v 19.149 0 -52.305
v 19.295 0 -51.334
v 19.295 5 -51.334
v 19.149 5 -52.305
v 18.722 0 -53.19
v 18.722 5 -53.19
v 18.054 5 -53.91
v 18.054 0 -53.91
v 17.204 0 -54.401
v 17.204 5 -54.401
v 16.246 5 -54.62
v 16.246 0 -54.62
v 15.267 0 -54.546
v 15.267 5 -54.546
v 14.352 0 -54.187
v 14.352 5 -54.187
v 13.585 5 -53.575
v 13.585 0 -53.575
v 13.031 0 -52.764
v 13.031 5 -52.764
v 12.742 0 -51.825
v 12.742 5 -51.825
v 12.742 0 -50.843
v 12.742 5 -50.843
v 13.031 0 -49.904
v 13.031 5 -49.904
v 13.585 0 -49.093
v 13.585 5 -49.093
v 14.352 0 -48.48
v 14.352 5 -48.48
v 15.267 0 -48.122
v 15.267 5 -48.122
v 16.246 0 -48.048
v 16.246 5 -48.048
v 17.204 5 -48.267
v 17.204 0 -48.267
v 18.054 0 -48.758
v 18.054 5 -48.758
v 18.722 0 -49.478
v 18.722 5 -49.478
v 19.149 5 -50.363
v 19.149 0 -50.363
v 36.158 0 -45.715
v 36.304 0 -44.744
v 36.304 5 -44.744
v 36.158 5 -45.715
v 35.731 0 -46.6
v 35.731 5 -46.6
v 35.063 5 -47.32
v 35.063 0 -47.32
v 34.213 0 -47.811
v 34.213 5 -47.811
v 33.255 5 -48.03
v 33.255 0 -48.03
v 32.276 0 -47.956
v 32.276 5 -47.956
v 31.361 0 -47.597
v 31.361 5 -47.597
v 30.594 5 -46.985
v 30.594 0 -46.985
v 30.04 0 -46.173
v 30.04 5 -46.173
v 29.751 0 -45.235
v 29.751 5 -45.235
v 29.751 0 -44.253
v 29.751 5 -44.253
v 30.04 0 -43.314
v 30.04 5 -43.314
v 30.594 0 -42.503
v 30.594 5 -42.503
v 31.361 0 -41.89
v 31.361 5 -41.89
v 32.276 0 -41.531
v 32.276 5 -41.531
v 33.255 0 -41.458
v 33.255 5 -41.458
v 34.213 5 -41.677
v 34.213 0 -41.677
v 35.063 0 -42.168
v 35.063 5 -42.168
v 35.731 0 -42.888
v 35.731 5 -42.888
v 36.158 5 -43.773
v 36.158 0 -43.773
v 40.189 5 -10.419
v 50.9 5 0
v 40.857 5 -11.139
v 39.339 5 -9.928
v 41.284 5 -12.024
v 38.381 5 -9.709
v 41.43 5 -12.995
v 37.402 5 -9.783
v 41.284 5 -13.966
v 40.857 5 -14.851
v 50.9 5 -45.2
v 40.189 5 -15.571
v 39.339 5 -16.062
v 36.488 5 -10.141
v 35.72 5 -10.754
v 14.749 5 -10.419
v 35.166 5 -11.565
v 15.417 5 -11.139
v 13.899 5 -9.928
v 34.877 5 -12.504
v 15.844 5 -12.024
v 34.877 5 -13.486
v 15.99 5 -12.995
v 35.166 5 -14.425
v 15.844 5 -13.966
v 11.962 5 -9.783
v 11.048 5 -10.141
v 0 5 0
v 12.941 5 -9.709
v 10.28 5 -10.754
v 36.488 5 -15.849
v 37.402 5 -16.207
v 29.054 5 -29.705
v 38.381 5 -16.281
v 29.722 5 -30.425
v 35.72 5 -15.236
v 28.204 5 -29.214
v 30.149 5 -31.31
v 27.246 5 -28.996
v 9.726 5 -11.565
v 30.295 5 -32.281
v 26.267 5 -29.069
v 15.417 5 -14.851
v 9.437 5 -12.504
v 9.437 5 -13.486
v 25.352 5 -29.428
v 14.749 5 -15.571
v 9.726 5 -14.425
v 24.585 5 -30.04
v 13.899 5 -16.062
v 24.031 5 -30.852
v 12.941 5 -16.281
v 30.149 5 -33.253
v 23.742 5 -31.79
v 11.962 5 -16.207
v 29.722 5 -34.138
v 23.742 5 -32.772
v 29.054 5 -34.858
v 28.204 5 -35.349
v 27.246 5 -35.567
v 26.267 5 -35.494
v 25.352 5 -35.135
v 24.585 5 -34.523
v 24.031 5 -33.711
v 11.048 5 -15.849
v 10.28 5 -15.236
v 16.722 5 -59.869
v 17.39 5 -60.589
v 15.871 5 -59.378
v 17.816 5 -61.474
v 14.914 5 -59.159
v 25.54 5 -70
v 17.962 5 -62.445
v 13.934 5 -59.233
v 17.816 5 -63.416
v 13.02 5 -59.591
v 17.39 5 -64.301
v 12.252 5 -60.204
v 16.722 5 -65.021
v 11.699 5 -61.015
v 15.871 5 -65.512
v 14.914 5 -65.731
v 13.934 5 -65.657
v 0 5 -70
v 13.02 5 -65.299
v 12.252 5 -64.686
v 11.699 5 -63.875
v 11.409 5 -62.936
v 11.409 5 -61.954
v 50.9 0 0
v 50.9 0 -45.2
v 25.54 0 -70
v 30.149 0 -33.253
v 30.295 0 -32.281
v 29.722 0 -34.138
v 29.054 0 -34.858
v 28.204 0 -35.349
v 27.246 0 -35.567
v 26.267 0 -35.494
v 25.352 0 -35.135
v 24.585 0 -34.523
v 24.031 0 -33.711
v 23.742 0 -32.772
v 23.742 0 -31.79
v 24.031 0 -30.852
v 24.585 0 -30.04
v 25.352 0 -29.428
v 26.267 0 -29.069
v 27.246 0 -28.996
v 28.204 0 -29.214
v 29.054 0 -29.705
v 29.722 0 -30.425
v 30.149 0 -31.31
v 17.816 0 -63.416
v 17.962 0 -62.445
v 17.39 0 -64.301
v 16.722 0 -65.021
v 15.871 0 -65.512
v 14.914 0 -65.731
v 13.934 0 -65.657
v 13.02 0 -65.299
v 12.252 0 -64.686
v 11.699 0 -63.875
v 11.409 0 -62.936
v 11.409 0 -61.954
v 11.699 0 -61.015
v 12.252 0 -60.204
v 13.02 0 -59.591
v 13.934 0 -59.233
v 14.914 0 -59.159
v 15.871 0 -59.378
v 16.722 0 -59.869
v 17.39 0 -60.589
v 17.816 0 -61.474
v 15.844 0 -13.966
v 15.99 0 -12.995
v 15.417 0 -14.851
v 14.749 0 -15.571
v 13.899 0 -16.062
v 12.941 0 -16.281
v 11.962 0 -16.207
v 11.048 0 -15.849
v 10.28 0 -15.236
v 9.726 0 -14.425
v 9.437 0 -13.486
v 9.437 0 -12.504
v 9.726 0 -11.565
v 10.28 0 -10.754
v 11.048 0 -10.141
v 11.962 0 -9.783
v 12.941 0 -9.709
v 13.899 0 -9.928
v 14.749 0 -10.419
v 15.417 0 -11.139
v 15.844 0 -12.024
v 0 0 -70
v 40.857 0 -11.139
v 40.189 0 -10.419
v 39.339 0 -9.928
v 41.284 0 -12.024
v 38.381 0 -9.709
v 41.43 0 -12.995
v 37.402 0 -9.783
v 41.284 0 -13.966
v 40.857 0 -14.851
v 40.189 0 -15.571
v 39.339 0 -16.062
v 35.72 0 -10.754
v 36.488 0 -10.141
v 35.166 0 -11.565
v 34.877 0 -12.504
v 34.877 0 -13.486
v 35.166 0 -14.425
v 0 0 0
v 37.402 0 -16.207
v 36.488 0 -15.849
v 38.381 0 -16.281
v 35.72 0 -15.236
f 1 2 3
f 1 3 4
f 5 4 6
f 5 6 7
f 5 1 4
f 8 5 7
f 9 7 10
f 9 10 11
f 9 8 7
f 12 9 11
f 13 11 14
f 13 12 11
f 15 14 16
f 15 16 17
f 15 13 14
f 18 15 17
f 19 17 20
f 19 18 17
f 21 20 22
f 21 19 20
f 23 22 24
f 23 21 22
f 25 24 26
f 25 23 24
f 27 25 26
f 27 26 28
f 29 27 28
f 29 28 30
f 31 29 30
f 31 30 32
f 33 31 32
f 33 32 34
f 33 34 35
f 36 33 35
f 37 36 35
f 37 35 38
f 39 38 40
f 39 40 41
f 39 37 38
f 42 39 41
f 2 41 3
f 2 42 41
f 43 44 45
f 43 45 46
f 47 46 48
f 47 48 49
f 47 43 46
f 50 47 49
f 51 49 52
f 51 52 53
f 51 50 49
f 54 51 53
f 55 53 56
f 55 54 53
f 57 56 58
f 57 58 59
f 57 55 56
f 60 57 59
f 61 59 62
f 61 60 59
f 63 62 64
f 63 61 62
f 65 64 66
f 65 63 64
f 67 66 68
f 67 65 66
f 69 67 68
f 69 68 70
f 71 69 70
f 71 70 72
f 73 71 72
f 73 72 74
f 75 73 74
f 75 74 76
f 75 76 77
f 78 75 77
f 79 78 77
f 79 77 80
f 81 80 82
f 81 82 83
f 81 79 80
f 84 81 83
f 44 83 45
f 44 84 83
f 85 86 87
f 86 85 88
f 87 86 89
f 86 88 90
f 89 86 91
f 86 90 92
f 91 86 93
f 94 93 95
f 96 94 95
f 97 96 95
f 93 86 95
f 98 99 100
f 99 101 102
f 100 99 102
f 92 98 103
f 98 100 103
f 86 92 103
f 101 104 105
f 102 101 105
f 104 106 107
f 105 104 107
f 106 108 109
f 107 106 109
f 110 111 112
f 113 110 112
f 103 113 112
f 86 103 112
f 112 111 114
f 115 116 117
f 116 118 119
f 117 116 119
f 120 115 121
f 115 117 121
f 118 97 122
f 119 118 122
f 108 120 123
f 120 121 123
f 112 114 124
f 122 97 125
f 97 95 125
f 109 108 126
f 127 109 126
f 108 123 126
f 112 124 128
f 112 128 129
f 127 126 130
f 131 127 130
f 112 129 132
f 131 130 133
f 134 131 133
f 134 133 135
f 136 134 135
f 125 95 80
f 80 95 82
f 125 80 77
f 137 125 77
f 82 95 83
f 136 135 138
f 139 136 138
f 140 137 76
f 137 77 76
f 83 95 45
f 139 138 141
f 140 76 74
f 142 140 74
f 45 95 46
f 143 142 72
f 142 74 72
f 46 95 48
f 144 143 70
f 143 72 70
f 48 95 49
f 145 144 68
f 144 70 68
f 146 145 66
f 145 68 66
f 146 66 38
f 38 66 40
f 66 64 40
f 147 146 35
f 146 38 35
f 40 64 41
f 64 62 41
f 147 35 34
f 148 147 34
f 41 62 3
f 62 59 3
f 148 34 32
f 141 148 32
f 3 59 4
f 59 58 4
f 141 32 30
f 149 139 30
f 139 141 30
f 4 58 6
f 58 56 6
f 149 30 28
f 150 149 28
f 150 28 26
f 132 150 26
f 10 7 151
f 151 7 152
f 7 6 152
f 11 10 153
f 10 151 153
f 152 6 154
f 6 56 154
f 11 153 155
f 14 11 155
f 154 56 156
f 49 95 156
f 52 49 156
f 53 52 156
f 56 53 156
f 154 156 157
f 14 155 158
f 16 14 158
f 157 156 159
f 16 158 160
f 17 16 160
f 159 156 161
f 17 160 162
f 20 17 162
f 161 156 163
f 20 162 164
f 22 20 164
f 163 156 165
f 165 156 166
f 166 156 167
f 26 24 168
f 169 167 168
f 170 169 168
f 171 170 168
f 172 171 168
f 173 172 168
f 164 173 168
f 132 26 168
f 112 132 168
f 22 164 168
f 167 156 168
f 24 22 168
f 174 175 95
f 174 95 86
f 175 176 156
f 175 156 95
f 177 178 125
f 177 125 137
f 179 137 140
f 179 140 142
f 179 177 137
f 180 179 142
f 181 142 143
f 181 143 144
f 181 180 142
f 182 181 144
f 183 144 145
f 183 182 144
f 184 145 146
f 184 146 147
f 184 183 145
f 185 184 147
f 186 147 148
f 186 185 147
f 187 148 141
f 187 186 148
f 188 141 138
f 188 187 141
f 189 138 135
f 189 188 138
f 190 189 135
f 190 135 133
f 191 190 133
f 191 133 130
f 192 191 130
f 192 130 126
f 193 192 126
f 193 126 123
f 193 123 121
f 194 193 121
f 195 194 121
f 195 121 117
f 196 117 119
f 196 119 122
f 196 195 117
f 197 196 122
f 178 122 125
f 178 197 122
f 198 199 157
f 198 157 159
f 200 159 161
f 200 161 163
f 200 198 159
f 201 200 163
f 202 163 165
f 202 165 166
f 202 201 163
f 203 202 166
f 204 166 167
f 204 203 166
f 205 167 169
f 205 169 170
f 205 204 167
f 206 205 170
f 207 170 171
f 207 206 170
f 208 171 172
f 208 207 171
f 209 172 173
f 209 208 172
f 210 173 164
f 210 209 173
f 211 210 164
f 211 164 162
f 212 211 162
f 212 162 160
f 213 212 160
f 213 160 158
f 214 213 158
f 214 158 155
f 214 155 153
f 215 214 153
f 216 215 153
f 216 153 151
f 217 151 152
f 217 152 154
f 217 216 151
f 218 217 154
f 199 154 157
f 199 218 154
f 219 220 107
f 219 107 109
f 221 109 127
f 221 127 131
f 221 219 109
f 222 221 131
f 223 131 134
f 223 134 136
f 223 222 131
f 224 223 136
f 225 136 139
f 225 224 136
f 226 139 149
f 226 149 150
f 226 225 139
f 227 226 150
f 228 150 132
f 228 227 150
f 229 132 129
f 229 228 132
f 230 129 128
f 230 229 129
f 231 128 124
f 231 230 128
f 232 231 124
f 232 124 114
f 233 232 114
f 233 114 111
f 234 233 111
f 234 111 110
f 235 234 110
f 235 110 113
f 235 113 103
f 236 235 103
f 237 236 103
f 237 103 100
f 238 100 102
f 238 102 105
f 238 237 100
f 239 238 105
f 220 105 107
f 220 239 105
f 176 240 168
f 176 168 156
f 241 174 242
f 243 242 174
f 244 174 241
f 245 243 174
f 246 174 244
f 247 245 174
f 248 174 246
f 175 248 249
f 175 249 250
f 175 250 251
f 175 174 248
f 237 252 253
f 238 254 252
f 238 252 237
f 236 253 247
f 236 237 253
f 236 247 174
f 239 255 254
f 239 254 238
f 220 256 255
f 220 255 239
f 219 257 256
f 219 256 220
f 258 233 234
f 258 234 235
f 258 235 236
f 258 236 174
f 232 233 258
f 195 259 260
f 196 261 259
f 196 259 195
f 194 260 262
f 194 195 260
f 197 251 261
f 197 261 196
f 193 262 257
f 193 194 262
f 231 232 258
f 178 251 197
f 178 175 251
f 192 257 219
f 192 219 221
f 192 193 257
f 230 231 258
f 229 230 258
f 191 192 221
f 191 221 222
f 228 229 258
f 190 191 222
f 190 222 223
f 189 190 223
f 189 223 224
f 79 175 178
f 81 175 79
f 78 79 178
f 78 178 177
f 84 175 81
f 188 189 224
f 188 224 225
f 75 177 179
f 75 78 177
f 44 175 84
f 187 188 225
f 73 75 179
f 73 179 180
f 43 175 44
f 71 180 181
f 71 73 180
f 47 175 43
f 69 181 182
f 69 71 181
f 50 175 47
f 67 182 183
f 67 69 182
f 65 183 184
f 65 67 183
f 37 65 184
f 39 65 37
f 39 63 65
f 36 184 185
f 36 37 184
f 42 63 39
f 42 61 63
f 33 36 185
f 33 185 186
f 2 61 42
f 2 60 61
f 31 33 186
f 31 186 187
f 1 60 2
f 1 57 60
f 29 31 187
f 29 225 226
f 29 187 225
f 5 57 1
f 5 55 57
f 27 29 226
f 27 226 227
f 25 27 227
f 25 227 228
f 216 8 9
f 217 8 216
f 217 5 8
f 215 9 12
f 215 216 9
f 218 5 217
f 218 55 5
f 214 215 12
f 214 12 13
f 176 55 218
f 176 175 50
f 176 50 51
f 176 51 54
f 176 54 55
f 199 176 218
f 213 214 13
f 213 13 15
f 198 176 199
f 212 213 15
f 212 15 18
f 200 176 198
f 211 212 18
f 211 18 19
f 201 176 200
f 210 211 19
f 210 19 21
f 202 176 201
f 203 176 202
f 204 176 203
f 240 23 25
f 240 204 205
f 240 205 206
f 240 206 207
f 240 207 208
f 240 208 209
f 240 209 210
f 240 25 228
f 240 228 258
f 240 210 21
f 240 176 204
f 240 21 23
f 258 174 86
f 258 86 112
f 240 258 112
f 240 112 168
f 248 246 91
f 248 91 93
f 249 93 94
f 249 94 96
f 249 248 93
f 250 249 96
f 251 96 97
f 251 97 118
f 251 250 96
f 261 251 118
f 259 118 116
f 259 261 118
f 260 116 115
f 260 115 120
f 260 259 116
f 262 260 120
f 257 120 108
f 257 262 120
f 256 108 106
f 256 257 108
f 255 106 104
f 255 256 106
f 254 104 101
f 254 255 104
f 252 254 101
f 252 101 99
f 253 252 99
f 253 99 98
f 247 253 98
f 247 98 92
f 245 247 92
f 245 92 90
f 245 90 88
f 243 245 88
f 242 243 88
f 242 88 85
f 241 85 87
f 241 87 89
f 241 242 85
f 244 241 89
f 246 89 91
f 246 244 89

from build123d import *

# Parameters (mm, degrees)
SKETCH1_R           = 3.295
BOSS_EXTRUDE1_DEPTH = 5


with BuildPart() as part:
    # Sketch1 → Boss-Extrude1 (new body)
    with BuildSketch(Plane(origin=(0, 0, 0), x_dir=(1, 0, 0), z_dir=(0, 1, 0))):
        Polygon((0, 0), (0, 70), (25.54, 70), (50.9, 45.2), (50.9, 0), align=None)
        with Locations((14.667483235, 62.445)):
            Circle(SKETCH1_R, mode=Mode.SUBTRACT)
        with Locations((33.008944764, 44.743844982)):
            Circle(SKETCH1_R, mode=Mode.SUBTRACT)
        with Locations((12.695, 12.995)):
            Circle(SKETCH1_R, mode=Mode.SUBTRACT)
        with Locations((38.135, 12.995)):
            Circle(SKETCH1_R, mode=Mode.SUBTRACT)
        with Locations((16, 51.333944626)):
            Circle(SKETCH1_R, mode=Mode.SUBTRACT)
        with Locations((27, 32.281385742)):
            Circle(SKETCH1_R, mode=Mode.SUBTRACT)
    extrude(amount=BOSS_EXTRUDE1_DEPTH)


solid = part.part
